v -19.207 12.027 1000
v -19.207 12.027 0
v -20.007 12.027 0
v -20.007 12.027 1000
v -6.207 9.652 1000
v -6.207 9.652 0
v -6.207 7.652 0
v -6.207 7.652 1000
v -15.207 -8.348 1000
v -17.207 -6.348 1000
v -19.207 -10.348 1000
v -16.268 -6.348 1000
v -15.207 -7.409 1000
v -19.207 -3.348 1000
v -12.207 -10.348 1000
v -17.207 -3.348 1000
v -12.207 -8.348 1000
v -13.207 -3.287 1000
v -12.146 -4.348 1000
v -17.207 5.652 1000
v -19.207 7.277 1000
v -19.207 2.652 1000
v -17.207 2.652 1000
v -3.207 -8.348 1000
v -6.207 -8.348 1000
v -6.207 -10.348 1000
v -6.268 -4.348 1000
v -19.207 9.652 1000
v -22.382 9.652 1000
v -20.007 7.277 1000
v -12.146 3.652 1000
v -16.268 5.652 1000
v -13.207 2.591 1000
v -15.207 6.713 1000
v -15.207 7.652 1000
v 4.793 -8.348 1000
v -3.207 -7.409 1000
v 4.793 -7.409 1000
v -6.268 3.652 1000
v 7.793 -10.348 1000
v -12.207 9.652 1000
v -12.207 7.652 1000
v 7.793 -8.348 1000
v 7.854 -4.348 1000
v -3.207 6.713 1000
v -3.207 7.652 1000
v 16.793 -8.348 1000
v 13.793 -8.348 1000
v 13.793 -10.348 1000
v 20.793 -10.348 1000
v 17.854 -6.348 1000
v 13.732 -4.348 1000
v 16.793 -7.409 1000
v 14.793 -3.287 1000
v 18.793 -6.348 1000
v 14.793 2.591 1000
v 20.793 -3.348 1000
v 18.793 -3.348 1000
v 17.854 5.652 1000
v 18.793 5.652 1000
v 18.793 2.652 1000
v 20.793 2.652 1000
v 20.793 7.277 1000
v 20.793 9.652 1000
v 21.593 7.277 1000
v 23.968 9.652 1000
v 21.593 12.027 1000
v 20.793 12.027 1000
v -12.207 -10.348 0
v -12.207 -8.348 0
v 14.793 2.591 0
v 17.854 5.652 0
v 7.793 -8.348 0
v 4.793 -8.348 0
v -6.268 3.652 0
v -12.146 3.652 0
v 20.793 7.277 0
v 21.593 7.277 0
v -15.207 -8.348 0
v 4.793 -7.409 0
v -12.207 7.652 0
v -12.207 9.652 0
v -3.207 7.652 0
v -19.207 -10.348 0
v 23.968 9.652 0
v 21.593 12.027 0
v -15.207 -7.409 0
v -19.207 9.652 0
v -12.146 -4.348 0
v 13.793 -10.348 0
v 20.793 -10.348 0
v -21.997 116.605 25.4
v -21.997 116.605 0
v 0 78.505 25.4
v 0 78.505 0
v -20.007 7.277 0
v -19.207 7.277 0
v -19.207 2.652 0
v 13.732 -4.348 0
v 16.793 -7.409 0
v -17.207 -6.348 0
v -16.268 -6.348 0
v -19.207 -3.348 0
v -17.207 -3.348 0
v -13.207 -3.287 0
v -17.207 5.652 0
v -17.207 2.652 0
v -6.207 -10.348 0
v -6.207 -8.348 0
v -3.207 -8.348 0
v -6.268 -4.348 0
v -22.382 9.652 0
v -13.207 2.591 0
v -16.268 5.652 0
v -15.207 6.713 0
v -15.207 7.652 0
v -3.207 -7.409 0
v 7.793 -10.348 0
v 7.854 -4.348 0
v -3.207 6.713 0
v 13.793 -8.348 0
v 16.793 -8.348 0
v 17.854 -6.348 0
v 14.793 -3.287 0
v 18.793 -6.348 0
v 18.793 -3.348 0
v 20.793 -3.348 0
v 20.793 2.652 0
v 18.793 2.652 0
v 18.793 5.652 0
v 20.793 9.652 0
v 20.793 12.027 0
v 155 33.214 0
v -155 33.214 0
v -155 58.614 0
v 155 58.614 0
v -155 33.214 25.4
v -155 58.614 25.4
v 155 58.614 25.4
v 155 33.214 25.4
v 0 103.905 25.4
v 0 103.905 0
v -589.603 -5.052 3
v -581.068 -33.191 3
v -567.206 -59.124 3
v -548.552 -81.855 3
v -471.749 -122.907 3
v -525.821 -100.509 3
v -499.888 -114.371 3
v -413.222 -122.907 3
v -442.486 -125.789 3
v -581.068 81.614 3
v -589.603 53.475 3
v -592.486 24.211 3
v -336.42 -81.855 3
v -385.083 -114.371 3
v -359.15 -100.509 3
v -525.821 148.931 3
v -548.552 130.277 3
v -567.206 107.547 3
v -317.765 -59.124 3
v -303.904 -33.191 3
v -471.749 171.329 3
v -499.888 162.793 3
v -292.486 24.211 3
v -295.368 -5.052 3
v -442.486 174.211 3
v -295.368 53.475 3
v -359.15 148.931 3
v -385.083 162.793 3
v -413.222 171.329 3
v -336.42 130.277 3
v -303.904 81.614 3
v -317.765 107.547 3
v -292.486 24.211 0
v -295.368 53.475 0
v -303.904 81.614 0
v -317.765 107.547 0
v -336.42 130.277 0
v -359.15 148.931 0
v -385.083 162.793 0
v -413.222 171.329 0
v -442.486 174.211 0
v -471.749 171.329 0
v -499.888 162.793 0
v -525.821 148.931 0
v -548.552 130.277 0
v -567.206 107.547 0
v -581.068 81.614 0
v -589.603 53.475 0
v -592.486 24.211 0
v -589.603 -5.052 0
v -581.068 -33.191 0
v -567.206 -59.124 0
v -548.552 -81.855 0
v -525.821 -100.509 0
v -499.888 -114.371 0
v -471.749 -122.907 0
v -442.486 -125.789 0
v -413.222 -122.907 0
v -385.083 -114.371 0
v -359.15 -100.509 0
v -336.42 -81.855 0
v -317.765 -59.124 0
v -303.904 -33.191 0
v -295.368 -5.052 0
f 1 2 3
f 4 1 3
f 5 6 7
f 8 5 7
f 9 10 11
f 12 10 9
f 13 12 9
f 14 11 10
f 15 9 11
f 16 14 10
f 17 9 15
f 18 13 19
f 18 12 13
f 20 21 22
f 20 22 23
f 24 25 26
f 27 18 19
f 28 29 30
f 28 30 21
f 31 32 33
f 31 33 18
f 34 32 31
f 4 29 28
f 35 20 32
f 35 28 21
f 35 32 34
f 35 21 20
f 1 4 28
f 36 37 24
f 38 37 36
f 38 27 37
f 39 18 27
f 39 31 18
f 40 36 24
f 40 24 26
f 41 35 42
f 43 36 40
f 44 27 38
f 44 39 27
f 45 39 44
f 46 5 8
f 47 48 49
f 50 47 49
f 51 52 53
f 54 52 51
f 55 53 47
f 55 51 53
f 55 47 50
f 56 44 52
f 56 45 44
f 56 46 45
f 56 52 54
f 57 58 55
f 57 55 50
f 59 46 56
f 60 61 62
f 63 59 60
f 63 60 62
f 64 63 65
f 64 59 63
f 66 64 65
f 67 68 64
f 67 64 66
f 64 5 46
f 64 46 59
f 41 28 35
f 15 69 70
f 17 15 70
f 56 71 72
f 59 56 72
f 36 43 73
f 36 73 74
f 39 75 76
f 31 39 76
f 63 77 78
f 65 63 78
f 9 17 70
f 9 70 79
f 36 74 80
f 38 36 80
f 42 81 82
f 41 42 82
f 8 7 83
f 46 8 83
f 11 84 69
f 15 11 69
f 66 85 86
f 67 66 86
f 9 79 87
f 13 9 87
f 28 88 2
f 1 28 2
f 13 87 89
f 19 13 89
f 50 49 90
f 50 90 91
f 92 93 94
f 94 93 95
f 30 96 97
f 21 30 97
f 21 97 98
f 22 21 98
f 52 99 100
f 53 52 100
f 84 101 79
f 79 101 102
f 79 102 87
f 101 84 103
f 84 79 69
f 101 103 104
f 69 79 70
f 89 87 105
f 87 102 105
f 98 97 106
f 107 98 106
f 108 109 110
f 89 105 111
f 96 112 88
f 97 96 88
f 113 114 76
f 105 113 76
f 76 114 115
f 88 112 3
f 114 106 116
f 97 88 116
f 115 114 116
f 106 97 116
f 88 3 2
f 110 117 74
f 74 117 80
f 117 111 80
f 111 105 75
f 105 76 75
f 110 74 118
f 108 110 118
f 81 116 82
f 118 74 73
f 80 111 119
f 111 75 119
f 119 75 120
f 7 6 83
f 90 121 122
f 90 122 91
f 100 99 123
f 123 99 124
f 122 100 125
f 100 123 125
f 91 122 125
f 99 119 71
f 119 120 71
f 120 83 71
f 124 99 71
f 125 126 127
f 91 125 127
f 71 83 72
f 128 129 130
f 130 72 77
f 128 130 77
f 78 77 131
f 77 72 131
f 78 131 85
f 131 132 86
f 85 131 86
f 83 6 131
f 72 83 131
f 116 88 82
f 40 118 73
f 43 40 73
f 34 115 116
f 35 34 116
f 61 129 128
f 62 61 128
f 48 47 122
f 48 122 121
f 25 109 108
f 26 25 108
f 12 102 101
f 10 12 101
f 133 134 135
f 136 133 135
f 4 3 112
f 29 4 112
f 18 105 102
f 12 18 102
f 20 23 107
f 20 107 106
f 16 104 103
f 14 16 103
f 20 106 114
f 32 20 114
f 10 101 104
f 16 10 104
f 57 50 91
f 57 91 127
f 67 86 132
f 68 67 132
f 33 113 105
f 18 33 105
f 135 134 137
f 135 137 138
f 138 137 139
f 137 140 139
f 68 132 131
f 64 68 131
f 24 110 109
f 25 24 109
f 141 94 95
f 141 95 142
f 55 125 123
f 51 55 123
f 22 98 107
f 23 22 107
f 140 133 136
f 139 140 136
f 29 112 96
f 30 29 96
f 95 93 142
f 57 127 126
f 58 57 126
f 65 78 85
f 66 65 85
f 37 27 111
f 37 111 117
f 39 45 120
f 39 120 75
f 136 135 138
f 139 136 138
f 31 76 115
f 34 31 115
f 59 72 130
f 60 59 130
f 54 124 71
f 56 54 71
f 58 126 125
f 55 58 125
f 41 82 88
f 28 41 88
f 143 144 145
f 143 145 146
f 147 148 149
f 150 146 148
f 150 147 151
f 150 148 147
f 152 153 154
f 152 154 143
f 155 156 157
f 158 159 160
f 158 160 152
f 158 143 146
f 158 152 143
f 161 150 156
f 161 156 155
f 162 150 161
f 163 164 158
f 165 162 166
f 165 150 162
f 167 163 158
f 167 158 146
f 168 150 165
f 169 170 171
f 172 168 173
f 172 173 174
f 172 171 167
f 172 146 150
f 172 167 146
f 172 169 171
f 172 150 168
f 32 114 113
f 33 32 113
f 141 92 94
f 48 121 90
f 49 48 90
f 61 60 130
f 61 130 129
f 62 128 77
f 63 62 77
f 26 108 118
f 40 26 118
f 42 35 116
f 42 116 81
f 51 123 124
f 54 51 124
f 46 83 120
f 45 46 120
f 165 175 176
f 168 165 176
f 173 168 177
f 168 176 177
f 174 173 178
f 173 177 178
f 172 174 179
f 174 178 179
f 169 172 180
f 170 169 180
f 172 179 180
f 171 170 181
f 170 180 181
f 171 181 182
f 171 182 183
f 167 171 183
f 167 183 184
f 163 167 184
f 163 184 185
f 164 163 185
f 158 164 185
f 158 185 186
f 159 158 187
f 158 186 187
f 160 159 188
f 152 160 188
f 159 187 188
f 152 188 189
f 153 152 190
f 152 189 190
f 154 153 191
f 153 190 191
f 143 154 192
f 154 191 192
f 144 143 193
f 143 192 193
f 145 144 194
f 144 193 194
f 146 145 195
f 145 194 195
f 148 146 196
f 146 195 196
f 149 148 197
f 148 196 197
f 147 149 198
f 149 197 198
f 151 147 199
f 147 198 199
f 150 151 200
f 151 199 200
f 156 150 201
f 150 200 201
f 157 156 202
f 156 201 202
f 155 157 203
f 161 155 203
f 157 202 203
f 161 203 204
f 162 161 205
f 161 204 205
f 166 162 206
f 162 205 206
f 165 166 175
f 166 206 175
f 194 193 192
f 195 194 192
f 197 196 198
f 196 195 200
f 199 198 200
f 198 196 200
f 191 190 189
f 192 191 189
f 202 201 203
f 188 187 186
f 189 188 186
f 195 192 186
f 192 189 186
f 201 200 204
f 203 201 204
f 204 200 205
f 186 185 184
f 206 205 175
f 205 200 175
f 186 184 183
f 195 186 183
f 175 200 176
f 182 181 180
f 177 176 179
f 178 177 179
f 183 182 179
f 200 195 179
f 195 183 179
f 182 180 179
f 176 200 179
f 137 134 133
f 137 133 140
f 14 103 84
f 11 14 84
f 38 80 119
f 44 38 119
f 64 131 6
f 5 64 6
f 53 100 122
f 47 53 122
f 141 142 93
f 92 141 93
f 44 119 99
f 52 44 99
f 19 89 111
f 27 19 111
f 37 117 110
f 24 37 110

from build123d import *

# Parameters (mm, degrees)
F0_R     = 150
F1_DEPTH = 3
F3_DEPTH = 1000
F4_W     = 25.4
F4_H     = 25.4
F5_DEPTH = 155
F7_DEPTH = 25.4


with BuildPart() as f1:
    # F0 (on Top) → F1 (new body)
    with BuildSketch(Plane.XY):
        with Locations((-442.485638, 24.211056)):
            Circle(F0_R)
    extrude(amount=F1_DEPTH)


with BuildPart() as f3:
    # F2 (on Top) → F3 (new body)
    with BuildSketch(Plane.XY):
        Polygon((-19.207074, 9.652025), (-19.207074, 12.027027), (-20.007047, 12.027027), (-22.382061, 9.652013), (-20.007072, 7.277024), (-19.207074, 7.277024), (-19.207074, 2.652014), (-17.207078, 2.652014), (-17.207078, 5.652008), (-16.267735, 5.652008), (-13.20706, 2.591359), (-13.20706, -3.287319), (-16.267735, -6.347993), (-17.207078, -6.347993), (-17.207078, -3.347974), (-19.207074, -3.347974), (-19.207074, -10.347985), (-12.207062, -10.347985), (-12.207062, -8.347989), (-15.207056, -8.347989), (-15.207056, -7.408647), (-12.146407, -4.347972), (-6.267729, -4.347972), (-3.207055, -7.408647), (-3.207055, -8.347989), (-6.207074, -8.347989), (-6.207074, -10.347985), (7.792923, -10.347985), (7.792923, -8.347989), (4.792929, -8.347989), (4.792929, -7.408647), (7.853604, -4.347972), (13.732281, -4.347972), (16.792931, -7.408647), (16.792931, -8.347989), (13.792937, -8.347989), (13.792937, -10.347985), (20.792923, -10.347985), (20.792923, -3.347974), (18.792927, -3.347974), (18.792927, -6.347993), (17.853584, -6.347993), (14.792935, -3.287319), (14.792935, 2.591359), (17.853584, 5.652008), (18.792927, 5.652008), (18.792927, 2.652014), (20.792923, 2.652014), (20.792923, 7.277024), (21.592946, 7.277024), (23.967935, 9.652013), (21.592921, 12.027027), (20.792923, 12.027027), (20.792923, 9.652025), (-6.207074, 9.652025), (-6.207074, 7.652029), (-3.207055, 7.652029), (-3.207055, 6.712687), (-6.267729, 3.652012), (-12.146407, 3.652012), (-15.207056, 6.712687), (-15.207056, 7.652029), (-12.207062, 7.652029), (-12.207062, 9.652025), align=None)
    extrude(amount=F3_DEPTH)


with BuildPart() as f5:
    # F4 (on Right) → F5 (new body, symmetric)
    with BuildSketch(Plane.YZ):
        with Locations((45.914182, 12.7)):
            Rectangle(F4_W, F4_H)
    extrude(amount=F5_DEPTH, both=True)


with BuildPart() as f7:
    # F6 (on Top) → F7 (new body)
    with BuildSketch(Plane.XY):
        Polygon((-21.997045, 116.604632), (0, 78.504632), (0, 103.904632), align=None)
    extrude(amount=F7_DEPTH)


solid = Compound([f1.part, f3.part, f5.part, f7.part])
